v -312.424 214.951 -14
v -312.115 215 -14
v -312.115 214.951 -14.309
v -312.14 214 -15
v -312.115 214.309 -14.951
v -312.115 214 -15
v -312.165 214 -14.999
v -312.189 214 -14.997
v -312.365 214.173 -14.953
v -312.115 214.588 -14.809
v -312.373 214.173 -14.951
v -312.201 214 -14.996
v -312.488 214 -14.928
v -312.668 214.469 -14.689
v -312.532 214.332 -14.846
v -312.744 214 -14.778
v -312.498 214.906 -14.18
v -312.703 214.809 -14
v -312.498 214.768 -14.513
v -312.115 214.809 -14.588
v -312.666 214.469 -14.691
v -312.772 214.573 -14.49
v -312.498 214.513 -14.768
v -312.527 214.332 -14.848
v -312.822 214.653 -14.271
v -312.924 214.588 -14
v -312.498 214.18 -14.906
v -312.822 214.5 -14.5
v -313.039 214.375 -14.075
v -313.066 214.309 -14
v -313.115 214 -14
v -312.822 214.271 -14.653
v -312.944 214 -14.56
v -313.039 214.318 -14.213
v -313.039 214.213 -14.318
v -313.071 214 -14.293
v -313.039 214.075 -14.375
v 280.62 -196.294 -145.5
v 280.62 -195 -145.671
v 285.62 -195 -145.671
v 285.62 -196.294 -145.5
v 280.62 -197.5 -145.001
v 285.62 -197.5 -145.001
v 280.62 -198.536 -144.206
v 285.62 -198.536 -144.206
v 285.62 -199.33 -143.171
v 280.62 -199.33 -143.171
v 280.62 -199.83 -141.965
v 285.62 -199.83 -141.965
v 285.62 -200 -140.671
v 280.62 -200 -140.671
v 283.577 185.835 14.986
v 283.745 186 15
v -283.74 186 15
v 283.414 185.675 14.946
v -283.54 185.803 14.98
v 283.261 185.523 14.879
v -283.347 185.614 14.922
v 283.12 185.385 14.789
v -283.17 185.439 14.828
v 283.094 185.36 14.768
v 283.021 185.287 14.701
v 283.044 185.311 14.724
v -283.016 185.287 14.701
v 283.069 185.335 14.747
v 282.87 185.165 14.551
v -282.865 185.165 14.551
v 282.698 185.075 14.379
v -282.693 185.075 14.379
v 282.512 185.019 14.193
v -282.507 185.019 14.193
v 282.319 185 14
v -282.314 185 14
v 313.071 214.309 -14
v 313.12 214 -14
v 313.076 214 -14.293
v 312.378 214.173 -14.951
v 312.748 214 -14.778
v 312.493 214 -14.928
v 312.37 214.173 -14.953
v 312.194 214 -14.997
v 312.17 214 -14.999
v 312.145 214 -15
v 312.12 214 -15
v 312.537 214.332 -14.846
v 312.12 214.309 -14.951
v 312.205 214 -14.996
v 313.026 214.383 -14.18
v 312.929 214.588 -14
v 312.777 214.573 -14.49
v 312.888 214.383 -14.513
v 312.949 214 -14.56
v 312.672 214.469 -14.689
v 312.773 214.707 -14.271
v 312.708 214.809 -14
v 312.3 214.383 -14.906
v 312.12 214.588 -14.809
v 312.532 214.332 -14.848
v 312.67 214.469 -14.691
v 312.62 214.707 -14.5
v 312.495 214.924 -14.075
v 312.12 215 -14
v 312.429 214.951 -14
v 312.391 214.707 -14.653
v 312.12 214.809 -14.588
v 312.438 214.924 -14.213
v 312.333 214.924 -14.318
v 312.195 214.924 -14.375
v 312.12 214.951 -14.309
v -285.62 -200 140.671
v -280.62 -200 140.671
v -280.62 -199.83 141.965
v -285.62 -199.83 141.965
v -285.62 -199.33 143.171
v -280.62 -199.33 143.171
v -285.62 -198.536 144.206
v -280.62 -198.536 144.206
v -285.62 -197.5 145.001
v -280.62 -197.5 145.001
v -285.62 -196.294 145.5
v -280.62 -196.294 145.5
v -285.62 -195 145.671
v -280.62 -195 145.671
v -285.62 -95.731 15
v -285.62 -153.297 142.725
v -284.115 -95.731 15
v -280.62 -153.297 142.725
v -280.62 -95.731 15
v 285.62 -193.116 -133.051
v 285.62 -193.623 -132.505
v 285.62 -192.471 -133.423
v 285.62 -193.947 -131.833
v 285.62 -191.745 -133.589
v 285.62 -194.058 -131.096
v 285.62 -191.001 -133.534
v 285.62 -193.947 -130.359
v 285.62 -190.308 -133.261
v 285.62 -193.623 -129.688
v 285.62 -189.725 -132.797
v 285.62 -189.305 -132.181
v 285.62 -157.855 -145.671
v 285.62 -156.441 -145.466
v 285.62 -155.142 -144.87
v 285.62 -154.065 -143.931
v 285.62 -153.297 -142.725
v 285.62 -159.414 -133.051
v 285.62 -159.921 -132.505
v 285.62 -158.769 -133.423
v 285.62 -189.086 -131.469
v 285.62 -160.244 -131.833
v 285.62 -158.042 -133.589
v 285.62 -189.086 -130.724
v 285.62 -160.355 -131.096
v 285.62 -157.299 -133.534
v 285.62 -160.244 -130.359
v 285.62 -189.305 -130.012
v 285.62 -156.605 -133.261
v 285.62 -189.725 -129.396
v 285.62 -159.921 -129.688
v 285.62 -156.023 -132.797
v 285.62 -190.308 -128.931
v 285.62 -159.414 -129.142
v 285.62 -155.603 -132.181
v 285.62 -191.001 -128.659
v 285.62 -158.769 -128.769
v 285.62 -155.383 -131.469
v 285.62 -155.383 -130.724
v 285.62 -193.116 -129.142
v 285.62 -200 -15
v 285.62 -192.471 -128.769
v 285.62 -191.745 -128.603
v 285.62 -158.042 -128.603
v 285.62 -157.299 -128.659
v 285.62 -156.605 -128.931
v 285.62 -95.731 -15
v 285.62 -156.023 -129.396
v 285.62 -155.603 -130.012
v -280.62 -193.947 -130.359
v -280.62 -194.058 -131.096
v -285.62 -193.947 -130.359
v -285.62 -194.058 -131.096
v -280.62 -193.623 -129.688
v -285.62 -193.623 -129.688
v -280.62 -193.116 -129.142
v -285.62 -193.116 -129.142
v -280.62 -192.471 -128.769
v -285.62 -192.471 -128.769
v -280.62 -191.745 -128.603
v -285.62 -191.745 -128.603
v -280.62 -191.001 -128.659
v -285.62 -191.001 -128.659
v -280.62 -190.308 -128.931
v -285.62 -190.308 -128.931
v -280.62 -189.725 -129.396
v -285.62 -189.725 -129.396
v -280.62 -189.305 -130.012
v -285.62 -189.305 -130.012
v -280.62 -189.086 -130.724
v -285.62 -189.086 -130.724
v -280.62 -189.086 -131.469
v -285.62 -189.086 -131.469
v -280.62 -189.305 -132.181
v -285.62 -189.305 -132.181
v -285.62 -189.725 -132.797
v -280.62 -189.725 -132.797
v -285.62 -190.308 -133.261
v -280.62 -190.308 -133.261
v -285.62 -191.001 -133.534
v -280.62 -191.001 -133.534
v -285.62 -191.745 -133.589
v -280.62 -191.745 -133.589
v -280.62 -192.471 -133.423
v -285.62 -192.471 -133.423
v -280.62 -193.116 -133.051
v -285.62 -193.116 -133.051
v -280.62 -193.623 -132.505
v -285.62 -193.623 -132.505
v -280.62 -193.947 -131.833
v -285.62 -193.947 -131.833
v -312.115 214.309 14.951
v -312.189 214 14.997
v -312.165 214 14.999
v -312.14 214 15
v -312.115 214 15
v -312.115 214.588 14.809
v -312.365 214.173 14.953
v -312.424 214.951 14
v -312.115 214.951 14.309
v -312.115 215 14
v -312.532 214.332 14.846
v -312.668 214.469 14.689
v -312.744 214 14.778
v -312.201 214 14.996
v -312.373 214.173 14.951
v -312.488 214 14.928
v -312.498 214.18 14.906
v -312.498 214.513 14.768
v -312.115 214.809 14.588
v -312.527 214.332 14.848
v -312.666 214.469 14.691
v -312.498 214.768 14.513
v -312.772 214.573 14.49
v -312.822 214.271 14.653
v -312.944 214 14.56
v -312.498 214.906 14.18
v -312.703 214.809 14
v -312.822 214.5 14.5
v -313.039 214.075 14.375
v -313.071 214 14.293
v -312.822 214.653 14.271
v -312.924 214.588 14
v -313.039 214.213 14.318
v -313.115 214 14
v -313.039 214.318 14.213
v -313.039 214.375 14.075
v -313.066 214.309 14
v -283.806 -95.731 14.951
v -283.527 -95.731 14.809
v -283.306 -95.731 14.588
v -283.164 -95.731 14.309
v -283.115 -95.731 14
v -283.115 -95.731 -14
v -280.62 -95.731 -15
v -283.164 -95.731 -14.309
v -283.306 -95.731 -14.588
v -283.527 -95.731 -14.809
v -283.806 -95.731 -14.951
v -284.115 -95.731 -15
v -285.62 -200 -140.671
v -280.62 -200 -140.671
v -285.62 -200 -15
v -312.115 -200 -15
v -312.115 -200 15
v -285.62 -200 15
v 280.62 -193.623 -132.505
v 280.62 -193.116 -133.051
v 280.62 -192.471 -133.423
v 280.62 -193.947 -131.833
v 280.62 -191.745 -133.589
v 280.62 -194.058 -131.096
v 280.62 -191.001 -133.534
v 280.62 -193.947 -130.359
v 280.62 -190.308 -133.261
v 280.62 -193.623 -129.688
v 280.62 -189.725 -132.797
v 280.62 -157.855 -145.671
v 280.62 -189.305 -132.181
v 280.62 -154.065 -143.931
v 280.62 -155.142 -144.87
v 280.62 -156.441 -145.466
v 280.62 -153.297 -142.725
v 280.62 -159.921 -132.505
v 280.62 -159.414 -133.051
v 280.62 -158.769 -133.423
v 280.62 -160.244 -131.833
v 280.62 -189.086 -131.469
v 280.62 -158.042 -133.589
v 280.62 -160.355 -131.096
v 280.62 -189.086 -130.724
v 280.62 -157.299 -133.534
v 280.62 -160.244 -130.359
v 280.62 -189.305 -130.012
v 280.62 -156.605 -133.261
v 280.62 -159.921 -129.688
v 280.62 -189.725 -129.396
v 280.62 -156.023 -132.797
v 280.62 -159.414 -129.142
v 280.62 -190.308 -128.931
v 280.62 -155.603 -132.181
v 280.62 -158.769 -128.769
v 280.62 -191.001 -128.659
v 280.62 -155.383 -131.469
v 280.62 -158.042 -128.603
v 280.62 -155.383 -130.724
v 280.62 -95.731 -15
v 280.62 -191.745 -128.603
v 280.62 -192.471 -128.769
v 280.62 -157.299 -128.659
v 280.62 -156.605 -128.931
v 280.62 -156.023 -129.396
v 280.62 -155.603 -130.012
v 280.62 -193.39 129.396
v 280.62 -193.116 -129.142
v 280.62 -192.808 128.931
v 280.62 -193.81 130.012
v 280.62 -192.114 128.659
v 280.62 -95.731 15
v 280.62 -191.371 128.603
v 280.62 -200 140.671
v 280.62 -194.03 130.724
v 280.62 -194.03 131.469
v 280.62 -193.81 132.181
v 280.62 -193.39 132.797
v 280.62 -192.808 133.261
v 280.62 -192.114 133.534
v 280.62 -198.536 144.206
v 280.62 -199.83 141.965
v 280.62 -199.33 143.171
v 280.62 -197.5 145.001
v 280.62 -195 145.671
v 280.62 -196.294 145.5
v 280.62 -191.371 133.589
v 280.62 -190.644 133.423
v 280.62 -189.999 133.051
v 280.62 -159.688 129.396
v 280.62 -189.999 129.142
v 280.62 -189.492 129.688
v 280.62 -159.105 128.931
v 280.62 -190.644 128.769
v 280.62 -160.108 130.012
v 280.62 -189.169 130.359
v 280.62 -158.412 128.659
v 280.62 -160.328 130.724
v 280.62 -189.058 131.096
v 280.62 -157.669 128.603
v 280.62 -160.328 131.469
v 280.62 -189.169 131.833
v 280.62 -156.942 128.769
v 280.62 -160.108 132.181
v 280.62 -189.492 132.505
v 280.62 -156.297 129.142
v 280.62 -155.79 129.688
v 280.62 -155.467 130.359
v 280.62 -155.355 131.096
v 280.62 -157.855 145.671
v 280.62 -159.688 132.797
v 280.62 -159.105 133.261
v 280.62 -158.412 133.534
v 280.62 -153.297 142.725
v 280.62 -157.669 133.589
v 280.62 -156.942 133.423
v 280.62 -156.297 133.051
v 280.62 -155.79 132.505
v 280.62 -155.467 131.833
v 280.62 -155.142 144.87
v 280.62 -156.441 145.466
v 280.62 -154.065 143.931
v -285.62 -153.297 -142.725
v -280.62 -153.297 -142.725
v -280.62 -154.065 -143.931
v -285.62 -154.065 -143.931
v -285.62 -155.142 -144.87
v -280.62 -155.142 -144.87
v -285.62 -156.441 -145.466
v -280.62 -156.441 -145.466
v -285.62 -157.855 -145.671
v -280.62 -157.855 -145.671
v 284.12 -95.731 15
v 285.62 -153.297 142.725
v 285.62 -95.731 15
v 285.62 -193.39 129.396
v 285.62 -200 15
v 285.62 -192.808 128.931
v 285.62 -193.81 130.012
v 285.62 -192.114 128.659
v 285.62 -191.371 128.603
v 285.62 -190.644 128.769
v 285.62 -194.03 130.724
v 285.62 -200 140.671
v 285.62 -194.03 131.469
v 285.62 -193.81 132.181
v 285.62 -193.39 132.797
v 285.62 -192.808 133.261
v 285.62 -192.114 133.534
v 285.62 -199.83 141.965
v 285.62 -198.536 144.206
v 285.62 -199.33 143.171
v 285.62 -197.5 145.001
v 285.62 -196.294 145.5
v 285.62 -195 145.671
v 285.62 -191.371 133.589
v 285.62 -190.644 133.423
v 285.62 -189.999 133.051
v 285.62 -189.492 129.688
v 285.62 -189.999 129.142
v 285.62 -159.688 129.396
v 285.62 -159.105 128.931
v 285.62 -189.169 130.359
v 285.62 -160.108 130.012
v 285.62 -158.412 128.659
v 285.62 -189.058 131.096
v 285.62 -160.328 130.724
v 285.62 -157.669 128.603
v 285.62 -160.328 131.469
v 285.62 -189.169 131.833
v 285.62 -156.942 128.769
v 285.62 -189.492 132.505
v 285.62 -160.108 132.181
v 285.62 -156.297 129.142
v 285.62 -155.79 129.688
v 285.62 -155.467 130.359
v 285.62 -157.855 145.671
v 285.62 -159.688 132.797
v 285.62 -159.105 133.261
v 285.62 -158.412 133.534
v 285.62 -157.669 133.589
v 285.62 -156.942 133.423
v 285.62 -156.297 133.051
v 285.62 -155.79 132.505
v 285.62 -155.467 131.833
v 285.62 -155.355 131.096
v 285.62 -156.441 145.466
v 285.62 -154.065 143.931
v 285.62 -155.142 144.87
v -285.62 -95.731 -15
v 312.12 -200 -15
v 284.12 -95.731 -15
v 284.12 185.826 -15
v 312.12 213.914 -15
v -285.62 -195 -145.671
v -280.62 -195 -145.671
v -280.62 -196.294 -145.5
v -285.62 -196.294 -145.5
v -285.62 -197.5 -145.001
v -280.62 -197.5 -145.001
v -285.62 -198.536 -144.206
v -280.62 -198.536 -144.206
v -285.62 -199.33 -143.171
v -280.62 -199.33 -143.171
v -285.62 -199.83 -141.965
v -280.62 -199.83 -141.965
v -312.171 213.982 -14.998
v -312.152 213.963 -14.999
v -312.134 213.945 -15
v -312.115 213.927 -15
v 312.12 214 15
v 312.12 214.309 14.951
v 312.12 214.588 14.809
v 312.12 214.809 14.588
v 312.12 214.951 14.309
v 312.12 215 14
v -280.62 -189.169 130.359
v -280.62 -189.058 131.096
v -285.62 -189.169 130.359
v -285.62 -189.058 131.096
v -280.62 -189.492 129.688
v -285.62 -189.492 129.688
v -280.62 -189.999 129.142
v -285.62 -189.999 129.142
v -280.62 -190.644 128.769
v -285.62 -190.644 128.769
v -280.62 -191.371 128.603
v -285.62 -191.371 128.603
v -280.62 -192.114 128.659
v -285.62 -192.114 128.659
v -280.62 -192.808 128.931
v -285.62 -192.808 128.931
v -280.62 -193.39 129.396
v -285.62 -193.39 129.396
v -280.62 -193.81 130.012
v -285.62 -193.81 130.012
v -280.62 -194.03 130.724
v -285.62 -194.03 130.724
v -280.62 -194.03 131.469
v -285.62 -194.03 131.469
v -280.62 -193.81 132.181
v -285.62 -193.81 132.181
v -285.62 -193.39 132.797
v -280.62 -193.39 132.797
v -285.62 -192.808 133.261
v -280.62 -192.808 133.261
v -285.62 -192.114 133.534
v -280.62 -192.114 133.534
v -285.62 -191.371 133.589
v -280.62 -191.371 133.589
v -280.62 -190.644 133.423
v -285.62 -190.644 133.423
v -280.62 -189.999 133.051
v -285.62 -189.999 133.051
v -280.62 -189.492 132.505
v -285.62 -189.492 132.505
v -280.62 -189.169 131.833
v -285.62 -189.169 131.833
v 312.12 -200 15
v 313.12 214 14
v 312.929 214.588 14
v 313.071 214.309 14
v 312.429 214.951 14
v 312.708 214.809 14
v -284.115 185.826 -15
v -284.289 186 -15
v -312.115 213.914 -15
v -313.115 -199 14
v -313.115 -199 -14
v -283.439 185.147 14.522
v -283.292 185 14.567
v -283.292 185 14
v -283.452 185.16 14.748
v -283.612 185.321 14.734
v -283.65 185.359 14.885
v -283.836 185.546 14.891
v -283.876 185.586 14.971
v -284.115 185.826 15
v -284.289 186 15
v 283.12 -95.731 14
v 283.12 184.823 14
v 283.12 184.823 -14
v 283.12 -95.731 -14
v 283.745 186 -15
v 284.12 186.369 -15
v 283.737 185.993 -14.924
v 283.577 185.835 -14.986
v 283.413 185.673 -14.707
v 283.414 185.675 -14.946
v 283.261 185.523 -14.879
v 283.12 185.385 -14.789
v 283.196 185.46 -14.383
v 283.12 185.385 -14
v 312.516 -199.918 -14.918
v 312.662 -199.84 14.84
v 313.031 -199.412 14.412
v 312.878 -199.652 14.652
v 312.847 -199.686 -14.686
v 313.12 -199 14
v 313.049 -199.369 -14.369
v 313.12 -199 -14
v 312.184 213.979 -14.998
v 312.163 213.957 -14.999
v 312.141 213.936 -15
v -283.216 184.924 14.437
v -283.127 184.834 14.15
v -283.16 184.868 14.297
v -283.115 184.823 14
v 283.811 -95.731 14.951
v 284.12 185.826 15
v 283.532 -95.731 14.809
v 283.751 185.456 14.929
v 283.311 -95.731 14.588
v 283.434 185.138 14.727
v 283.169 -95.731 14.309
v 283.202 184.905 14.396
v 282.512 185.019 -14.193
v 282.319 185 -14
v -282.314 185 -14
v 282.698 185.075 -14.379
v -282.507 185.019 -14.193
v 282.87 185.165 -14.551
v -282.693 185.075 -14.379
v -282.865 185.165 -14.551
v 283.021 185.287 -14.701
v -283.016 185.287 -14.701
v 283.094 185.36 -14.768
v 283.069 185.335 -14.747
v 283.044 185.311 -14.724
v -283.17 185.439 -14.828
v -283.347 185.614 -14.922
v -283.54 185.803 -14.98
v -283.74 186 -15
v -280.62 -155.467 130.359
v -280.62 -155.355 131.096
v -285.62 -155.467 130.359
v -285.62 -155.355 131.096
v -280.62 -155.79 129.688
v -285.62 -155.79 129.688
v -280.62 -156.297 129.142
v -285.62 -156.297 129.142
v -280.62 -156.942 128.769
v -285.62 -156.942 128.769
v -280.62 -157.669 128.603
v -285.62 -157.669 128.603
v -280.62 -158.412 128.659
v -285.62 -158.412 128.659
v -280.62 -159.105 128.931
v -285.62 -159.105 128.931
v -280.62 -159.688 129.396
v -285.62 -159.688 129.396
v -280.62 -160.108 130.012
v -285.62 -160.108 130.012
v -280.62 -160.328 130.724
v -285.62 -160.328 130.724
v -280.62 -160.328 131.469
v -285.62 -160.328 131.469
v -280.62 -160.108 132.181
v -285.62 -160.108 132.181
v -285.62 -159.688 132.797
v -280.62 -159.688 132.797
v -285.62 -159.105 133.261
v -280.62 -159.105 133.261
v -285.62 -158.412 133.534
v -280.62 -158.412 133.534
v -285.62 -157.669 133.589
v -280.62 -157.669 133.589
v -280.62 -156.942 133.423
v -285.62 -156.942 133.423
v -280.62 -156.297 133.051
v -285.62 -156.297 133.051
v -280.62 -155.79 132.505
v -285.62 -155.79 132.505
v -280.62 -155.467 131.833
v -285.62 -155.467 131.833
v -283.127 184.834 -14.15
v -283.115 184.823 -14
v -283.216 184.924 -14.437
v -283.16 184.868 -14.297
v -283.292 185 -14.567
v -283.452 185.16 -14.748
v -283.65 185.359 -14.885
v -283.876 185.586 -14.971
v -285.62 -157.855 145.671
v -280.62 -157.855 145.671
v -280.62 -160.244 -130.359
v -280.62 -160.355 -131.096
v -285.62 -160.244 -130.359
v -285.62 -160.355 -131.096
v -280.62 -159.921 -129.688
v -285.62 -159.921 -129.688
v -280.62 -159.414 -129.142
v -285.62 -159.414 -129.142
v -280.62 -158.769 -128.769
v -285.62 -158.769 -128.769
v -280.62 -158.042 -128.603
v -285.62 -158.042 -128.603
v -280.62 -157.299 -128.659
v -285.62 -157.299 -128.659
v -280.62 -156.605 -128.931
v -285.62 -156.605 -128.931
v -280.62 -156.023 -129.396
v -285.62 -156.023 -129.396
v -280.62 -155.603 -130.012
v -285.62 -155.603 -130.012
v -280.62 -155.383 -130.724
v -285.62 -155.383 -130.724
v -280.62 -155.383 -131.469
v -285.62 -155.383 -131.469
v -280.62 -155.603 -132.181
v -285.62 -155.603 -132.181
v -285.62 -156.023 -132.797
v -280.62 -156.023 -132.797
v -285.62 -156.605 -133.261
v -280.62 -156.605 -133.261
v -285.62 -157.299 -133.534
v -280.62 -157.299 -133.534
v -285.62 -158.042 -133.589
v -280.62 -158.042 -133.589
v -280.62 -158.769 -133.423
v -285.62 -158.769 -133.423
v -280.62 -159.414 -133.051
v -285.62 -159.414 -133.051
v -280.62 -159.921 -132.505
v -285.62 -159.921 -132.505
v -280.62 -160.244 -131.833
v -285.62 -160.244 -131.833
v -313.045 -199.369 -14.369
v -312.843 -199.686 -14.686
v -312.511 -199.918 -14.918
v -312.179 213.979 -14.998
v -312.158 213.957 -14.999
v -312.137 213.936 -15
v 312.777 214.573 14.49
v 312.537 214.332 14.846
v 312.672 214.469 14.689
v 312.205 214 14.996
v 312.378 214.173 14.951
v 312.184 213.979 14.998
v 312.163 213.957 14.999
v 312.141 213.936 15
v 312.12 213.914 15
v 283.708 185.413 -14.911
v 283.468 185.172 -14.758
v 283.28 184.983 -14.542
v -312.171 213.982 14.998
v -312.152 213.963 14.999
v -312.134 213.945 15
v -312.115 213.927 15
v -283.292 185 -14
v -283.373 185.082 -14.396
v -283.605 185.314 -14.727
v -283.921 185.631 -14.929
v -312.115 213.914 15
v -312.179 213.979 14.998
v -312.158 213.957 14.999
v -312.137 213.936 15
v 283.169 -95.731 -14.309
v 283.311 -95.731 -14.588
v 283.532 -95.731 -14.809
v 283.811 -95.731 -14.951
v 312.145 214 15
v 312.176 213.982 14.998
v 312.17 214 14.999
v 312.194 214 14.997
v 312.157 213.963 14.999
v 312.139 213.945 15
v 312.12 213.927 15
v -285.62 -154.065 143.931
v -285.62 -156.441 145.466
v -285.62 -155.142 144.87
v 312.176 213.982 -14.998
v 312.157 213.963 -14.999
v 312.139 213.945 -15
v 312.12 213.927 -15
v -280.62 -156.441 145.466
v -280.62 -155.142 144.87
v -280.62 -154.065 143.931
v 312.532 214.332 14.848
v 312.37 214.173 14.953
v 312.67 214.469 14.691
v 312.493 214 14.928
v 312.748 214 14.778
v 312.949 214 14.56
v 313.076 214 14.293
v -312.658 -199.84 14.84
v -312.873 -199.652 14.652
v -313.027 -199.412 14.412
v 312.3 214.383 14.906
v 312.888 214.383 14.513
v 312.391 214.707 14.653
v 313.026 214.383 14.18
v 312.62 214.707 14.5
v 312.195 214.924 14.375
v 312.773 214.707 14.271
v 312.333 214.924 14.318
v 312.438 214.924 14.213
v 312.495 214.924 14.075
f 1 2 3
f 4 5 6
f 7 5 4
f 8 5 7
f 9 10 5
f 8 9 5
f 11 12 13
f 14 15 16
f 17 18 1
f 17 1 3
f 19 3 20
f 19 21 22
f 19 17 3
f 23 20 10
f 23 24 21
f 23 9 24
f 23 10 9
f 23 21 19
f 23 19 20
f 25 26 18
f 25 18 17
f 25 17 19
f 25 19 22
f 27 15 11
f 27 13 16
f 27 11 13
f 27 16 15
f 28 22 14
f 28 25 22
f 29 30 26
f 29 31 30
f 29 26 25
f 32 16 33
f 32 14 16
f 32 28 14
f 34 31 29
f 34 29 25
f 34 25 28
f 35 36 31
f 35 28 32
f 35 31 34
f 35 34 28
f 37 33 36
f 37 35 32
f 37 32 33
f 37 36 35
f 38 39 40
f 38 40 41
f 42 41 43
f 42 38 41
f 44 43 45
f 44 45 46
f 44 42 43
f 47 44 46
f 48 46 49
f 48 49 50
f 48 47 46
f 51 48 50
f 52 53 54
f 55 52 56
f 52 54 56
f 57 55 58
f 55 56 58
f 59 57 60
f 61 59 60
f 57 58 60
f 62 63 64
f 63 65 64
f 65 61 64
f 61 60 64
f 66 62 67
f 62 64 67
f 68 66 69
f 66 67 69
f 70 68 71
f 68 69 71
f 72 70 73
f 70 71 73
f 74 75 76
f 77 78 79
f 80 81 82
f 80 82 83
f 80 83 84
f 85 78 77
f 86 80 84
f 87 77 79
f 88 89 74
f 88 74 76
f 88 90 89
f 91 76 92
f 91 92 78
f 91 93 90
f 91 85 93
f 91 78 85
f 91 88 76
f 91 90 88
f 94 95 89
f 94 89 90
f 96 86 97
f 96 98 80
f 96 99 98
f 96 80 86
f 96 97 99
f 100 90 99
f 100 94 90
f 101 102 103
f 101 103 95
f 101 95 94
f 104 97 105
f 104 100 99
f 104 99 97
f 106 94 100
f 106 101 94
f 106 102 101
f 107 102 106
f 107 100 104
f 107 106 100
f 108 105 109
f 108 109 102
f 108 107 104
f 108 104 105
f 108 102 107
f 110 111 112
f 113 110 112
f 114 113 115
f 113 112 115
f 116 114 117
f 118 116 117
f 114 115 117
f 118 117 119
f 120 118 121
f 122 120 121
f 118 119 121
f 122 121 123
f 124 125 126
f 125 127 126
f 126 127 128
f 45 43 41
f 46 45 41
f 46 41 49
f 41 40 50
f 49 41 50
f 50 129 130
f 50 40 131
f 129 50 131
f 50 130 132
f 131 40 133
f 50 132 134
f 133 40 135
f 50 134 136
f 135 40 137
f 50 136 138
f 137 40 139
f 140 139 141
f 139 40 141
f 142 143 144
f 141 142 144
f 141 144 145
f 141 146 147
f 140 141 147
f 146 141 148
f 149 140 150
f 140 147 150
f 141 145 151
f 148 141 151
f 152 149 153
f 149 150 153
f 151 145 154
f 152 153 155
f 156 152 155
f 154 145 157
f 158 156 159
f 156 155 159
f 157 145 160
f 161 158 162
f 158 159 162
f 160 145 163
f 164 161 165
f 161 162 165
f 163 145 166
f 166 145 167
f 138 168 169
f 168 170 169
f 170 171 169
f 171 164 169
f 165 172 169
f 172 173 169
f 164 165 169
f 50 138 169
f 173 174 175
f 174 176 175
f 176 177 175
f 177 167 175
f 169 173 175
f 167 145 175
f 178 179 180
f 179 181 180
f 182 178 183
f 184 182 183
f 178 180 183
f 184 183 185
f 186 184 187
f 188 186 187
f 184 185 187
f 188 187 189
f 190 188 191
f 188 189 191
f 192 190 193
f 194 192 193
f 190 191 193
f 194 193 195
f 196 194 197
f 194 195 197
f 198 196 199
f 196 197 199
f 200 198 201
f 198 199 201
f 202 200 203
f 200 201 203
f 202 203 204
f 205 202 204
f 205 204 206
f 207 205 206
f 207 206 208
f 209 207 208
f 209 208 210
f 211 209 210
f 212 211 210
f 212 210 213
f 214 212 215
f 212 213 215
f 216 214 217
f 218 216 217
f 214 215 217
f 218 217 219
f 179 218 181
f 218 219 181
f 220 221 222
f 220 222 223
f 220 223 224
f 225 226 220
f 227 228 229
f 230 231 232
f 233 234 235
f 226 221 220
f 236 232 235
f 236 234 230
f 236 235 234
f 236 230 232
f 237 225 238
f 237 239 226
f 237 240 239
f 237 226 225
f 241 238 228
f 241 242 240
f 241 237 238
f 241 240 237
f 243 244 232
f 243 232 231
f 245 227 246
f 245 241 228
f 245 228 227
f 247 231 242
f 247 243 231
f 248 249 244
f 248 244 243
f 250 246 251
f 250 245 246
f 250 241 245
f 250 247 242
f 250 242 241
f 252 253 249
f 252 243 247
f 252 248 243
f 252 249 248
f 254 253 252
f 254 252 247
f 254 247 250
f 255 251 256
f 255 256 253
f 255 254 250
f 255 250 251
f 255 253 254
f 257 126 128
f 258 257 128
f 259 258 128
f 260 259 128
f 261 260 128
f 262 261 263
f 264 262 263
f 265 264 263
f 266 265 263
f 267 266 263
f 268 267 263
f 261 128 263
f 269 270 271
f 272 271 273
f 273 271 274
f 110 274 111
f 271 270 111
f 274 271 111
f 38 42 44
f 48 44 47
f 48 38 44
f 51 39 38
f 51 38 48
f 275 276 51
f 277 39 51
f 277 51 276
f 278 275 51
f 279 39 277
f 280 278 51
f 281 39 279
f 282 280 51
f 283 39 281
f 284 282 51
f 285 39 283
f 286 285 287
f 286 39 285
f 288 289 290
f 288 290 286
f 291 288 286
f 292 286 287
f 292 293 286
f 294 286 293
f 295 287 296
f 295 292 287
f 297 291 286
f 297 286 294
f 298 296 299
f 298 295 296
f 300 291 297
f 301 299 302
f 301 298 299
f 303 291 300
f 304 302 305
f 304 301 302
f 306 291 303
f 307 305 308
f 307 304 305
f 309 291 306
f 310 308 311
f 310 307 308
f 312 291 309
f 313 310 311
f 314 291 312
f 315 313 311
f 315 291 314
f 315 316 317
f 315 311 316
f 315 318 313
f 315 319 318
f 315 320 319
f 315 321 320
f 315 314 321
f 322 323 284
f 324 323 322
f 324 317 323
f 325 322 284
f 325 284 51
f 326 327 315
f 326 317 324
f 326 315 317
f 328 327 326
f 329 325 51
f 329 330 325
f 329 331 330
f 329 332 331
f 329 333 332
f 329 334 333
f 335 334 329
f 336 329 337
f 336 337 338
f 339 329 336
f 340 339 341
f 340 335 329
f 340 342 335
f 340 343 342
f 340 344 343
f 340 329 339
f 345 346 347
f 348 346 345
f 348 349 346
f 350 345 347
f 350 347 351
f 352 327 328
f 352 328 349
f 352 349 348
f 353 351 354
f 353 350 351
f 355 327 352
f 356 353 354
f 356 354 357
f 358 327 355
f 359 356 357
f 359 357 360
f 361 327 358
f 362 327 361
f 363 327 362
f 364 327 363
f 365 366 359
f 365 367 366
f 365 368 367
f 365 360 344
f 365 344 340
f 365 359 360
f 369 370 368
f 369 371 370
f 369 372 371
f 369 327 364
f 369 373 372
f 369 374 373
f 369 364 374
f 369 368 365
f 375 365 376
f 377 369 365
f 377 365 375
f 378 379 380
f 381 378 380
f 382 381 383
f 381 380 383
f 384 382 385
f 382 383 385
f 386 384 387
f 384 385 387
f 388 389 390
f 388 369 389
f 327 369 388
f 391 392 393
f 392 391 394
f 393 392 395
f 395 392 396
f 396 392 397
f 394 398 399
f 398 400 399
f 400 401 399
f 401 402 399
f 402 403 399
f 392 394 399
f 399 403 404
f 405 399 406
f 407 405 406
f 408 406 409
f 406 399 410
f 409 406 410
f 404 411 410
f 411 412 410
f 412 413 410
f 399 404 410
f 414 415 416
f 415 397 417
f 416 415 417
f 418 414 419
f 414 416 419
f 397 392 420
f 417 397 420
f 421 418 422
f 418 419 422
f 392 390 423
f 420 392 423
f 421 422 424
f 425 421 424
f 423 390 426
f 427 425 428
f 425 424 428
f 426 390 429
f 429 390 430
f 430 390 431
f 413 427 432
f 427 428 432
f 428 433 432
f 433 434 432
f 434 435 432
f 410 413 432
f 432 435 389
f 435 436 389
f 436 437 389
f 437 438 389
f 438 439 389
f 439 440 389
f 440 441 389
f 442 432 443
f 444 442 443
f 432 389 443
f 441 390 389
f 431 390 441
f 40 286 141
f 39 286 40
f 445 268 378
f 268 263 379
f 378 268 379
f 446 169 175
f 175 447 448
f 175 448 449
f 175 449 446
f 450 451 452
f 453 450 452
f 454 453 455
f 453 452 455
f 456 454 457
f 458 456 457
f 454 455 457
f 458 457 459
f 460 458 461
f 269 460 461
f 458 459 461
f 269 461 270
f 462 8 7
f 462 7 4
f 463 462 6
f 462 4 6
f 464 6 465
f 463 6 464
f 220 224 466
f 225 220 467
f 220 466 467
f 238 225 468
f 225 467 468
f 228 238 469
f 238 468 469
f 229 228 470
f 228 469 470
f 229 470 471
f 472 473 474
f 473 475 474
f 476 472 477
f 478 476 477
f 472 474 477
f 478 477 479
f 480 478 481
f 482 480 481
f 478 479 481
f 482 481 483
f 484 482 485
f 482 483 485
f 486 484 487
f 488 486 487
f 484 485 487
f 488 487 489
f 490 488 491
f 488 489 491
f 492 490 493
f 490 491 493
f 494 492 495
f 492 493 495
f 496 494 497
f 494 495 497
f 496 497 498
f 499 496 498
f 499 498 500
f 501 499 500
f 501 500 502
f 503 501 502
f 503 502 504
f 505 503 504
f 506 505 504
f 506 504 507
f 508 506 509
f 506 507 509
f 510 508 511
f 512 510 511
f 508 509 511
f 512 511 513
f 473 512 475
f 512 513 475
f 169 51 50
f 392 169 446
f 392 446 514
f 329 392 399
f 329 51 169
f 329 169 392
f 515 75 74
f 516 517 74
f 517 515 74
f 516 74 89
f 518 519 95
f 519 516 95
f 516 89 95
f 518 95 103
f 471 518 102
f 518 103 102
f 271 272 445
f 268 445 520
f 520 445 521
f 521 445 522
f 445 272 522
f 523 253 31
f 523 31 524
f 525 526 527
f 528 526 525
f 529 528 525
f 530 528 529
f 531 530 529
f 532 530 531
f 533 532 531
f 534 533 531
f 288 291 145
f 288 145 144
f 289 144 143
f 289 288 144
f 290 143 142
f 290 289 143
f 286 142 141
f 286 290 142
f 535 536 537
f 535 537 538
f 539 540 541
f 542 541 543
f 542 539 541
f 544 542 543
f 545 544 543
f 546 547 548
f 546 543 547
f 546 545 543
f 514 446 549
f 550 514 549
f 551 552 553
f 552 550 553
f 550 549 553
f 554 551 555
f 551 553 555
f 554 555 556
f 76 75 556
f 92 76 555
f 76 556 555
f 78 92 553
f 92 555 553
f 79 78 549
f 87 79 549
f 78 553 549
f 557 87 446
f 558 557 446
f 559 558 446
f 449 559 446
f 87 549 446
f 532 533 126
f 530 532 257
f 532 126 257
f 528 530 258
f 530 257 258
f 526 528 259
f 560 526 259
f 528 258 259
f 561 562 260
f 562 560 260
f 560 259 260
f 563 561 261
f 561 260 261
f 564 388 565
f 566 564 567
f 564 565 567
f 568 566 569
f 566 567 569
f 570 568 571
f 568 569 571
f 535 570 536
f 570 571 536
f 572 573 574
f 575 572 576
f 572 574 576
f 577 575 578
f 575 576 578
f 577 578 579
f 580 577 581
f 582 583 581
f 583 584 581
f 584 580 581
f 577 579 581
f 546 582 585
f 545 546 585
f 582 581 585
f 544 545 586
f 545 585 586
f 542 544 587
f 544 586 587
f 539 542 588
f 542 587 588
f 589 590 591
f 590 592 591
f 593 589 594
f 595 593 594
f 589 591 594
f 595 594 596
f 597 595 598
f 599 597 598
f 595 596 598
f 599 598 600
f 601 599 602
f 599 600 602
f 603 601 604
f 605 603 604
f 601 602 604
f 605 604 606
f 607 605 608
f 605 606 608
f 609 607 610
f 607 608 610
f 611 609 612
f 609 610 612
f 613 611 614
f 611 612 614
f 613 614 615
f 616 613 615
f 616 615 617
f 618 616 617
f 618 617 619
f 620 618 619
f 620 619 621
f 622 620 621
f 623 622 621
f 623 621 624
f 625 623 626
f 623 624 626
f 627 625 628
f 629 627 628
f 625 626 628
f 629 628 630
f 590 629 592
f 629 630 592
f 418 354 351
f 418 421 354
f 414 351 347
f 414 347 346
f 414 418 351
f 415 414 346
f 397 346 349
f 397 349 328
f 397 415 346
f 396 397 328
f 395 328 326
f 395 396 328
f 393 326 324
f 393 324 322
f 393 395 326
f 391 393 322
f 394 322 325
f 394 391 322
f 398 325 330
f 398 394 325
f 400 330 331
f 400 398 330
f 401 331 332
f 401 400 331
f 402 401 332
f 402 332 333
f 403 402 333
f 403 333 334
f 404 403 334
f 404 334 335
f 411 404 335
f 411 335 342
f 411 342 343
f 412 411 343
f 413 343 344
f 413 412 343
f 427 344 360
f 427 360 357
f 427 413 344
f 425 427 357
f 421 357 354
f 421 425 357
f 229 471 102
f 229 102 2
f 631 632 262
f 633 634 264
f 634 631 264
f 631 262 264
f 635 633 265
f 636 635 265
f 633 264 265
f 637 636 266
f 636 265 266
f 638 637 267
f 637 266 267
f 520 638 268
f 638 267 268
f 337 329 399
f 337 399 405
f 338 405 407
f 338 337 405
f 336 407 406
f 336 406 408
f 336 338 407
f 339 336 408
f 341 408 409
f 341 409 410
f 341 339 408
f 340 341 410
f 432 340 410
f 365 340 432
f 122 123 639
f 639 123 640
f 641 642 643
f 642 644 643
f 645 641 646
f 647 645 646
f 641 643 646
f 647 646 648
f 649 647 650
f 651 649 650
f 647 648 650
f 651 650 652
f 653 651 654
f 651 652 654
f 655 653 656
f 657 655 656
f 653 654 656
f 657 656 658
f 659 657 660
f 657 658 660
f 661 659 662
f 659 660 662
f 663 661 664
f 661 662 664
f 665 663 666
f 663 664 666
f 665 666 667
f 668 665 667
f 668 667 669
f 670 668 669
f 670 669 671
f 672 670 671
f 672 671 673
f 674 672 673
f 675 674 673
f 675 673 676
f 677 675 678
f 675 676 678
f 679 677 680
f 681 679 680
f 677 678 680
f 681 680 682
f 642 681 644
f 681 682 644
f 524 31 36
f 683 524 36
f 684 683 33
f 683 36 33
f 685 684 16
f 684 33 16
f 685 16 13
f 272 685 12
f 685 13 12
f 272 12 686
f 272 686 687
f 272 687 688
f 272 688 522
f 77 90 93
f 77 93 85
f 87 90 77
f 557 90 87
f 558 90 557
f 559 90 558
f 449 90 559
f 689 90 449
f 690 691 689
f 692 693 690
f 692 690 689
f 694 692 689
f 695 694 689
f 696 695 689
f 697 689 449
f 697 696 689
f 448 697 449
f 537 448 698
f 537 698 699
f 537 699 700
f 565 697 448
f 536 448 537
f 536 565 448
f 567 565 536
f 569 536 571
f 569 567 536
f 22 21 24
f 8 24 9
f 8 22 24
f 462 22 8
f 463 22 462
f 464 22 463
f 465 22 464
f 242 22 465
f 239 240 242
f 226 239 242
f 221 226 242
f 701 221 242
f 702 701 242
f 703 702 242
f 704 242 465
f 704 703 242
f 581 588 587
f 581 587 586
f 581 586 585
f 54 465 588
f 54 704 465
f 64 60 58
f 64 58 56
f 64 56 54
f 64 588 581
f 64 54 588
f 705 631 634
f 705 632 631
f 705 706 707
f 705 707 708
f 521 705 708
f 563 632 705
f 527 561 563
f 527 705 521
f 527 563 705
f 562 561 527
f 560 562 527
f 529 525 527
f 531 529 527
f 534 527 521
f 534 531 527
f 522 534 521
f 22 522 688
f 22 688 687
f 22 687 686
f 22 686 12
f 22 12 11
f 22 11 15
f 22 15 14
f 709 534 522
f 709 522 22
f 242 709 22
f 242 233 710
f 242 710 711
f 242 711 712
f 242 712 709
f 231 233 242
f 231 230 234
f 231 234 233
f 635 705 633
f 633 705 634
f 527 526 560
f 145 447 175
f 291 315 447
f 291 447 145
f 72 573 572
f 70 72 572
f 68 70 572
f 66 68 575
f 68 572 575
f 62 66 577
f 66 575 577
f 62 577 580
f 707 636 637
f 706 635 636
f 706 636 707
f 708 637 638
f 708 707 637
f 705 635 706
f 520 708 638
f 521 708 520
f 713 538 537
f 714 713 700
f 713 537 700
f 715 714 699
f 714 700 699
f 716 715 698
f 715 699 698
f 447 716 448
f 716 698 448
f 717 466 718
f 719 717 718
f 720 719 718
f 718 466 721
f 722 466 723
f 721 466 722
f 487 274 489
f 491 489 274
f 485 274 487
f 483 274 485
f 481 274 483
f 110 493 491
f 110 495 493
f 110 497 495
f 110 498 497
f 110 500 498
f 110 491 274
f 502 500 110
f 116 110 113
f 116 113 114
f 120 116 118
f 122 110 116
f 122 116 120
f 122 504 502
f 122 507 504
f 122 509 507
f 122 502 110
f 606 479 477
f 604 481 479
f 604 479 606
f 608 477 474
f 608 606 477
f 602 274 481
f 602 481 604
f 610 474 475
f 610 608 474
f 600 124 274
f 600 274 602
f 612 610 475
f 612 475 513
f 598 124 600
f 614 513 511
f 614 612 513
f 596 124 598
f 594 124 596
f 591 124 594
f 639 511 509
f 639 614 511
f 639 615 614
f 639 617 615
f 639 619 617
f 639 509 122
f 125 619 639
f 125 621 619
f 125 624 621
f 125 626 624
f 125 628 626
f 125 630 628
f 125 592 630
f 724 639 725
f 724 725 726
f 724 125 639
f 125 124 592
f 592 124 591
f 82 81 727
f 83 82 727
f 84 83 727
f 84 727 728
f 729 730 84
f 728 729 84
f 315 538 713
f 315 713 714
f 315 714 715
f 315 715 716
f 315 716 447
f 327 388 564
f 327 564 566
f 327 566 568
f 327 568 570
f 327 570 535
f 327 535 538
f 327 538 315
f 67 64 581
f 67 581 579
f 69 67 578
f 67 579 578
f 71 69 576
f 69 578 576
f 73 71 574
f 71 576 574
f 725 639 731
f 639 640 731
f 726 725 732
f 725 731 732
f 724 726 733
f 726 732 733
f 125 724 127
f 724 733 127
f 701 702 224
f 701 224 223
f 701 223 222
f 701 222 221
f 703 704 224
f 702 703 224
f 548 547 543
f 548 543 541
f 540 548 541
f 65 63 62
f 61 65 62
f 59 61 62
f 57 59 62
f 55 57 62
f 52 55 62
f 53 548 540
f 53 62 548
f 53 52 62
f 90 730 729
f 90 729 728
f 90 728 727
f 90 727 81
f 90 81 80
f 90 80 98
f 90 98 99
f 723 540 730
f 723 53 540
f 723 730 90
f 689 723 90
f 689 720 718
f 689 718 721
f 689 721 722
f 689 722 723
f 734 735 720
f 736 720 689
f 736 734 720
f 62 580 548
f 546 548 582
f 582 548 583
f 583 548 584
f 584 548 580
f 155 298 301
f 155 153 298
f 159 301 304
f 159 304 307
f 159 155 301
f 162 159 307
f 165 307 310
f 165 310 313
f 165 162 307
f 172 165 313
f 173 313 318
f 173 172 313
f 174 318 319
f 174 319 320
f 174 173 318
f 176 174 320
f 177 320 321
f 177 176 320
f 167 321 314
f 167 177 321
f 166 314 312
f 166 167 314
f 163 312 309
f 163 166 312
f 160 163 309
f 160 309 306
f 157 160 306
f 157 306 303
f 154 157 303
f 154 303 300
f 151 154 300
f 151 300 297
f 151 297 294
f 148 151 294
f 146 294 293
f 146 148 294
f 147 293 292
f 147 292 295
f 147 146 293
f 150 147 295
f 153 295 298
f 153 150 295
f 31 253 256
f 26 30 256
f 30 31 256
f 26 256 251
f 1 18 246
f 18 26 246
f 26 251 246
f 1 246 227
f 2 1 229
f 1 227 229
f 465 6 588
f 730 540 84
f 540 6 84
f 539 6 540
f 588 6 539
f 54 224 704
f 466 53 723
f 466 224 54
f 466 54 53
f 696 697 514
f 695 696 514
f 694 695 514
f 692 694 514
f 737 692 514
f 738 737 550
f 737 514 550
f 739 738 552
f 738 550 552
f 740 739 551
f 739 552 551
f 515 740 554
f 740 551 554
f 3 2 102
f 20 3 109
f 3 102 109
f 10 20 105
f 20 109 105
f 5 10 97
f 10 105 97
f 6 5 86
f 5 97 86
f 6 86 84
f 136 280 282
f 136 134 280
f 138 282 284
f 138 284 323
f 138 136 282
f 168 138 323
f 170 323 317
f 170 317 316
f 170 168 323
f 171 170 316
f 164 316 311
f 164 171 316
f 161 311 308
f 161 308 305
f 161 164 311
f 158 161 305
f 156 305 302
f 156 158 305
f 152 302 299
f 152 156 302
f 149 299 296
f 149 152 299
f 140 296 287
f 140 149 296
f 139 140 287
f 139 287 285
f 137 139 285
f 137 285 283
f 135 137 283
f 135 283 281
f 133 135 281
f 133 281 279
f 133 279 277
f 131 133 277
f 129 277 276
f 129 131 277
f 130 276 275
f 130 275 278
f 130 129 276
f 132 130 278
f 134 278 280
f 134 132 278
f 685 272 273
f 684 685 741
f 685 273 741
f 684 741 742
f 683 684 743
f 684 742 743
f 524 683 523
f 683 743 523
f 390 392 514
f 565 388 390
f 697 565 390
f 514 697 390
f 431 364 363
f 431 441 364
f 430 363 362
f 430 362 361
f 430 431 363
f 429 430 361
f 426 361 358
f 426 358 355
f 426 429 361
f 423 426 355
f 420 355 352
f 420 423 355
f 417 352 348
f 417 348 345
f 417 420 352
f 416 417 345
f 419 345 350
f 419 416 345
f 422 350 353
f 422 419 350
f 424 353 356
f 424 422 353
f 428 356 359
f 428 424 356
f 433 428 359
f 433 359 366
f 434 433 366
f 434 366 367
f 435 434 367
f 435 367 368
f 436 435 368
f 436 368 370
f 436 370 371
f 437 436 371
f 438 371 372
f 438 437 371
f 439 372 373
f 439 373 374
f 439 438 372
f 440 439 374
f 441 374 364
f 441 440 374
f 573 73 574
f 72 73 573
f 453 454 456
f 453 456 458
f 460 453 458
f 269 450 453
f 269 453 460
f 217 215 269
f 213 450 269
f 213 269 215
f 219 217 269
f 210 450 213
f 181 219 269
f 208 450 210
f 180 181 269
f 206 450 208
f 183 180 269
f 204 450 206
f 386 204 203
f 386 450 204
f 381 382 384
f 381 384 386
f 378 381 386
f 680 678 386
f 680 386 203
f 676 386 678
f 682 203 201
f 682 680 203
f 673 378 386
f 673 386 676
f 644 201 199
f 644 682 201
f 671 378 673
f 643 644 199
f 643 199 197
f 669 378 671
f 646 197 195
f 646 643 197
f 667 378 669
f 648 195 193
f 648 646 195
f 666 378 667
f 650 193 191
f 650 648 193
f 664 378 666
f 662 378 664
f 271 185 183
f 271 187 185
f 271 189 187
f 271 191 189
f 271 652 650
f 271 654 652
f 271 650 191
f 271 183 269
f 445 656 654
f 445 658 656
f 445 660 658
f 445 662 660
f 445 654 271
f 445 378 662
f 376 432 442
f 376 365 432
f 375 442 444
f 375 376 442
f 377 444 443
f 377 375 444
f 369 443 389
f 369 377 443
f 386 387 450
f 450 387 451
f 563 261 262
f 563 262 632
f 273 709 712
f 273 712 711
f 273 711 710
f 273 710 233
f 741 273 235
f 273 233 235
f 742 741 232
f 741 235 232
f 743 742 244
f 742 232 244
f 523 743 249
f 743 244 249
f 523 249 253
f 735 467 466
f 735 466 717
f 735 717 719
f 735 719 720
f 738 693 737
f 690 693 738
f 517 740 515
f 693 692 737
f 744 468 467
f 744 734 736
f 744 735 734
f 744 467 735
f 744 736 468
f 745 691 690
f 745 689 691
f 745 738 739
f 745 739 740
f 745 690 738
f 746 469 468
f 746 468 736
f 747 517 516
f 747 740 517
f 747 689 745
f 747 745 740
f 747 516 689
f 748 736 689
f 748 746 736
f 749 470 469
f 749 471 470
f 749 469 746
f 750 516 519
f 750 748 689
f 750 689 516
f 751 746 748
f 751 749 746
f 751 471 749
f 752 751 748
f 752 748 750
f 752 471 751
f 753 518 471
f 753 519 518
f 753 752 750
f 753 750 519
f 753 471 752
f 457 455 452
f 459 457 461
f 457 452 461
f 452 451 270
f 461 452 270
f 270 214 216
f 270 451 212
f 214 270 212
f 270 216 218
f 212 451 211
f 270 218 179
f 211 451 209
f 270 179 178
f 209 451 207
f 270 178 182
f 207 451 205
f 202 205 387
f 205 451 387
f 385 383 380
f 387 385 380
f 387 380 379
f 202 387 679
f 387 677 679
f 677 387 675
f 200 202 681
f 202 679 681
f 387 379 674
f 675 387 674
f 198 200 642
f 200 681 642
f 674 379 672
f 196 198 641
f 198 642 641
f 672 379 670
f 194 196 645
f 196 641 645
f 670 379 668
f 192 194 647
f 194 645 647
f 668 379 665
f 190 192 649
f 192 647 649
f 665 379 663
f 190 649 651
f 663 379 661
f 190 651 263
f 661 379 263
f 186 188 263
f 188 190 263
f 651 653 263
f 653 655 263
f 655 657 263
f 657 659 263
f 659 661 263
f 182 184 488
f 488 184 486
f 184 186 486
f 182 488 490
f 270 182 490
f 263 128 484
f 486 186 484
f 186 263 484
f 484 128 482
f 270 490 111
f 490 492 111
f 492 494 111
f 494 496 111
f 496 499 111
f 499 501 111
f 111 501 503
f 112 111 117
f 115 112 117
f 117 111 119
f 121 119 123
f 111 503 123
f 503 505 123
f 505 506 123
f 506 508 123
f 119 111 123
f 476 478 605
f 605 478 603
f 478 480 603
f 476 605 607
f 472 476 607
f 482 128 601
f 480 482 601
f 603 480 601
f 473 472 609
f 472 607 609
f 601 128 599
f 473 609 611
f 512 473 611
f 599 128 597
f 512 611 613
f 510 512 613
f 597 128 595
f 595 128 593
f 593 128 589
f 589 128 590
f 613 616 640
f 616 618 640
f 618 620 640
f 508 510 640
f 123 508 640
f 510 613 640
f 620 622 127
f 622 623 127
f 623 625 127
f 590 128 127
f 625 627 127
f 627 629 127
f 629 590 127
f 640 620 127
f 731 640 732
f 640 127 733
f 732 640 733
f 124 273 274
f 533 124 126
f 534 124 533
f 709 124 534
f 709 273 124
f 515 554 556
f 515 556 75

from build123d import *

# Parameters (mm, degrees)
BOSS_EXTRUDE1_DEPTH = 15
SKETCH2_R           = 2.5
BOSS_EXTRUDE2_DEPTH = 2.5
FILLET1_R           = 1


with BuildPart() as part:
    # Sketch1 → Boss-Extrude1 (new, symmetric)
    with BuildSketch(Plane.XY):
        Polygon((-283.115153194, -200), (-283.115153194, 184.822832525), (-312.771891152, 214.573189293), (-282.723872007, 185), (282.728718813, 185), (312.776737958, 214.573189293), (283.12, 184.822832525), (283.12, -200), (313.12, -200), (313.12, 215), (-313.115153194, 215), (-313.115153194, -200), align=None)
    extrude(amount=BOSS_EXTRUDE1_DEPTH, both=True)

    # Sketch2 → Boss-Extrude2 (add, symmetric)
    with BuildSketch(Plane.ZY.offset(-283.12)):
        with BuildLine():
            Line((-15, -95.731232334), (-142.725217813, -153.297064452))
            ThreePointArc((-142.725217813, -153.297064452), (-144.870286213, -155.141843308), (-145.67073896, -157.855476088))
            Line((-145.67073896, -157.855476088), (-145.67073896, -195))
            ThreePointArc((-145.67073896, -195), (-144.206272866, -198.535533906), (-140.67073896, -200))
            Line((-140.67073896, -200), (140.67073896, -200))
            ThreePointArc((140.67073896, -200), (144.206272866, -198.535533906), (145.67073896, -195))
            Line((145.67073896, -195), (145.67073896, -157.855476088))
            ThreePointArc((145.67073896, -157.855476088), (144.870286213, -155.141843308), (142.725217813, -153.297064452))
            Line((142.725217813, -153.297064452), (15, -95.731232334))
            Line((15, -95.731232334), (-15, -95.731232334))
        make_face()
        with Locations(Location((-131.096268678, -157.855476088, 0), (0, 0, 270))):
            Circle(SKETCH2_R, mode=Mode.SUBTRACT)
        with Locations(Location((-131.096268678, -191.557763375, 0), (0, 0, 270))):
            Circle(SKETCH2_R, mode=Mode.SUBTRACT)
        with Locations(Location((131.096268678, -191.557763375, 0), (0, 0, 90))):
            Circle(SKETCH2_R, mode=Mode.SUBTRACT)
        with Locations(Location((131.096268678, -157.855476088, 0), (0, 0, 90))):
            Circle(SKETCH2_R, mode=Mode.SUBTRACT)
    boss_extrude2 = extrude(amount=BOSS_EXTRUDE2_DEPTH, both=True)

    # Mirror2: Boss-Extrude2 across plane
    add(boss_extrude2.mirror(Plane(origin=(0, 0, 0), x_dir=(0, 0, 1), z_dir=(1, 0, 0))))

    # Fillet1
    # the kernel refuses this fillet: 1 mm, written as the material it takes off along each edge
    with BuildSketch(Plane(origin=(-312.115153194, 214, -14), x_dir=(0, 0, -1), z_dir=(-1, 0, 0))) as fillet1_piece_1_section:
        Polygon((0, 0), (FILLET1_R * 1.02, 0), (FILLET1_R * 1.02, -FILLET1_R * 1.02), (0, -FILLET1_R * 1.02), align=None)
    fillet1_piece_1 = extrude(amount=FILLET1_R * 1.02, mode=Mode.PRIVATE)
    fillet1_piece_1 = fillet1_piece_1 - Plane(origin=(-312.115153194, 214, -14), x_dir=(0, -0.7071067811865475, 0.7071067811865475), z_dir=(-1, 0, 0)) * Sphere(FILLET1_R, mode=Mode.PRIVATE)
    add(fillet1_piece_1, mode=Mode.SUBTRACT)
    with BuildSketch(Plane(origin=(312.12, 214, -14), x_dir=(1, 0, 0), z_dir=(0, 1, 0))) as fillet1_piece_2_section:
        Polygon((0, 0), (FILLET1_R * 1.02, 0), (FILLET1_R * 1.02, FILLET1_R * 1.02), (0, FILLET1_R * 1.02), align=None)
    fillet1_piece_2 = extrude(amount=FILLET1_R * 1.02, mode=Mode.PRIVATE)
    fillet1_piece_2 = fillet1_piece_2 - Plane(origin=(312.12, 214, -14), x_dir=(-0.7071067811865475, 0, 0.7071067811865475), z_dir=(0, 1, 0)) * Sphere(FILLET1_R, mode=Mode.PRIVATE)
    add(fillet1_piece_2, mode=Mode.SUBTRACT)
    with BuildSketch(Plane(origin=(-312.115153194, 214, 14), x_dir=(0, 0, 1), z_dir=(-1, 0, 0))) as fillet1_piece_3_section:
        Polygon((0, 0), (FILLET1_R * 1.02, 0), (FILLET1_R * 1.02, FILLET1_R * 1.02), (0, FILLET1_R * 1.02), align=None)
    fillet1_piece_3 = extrude(amount=FILLET1_R * 1.02, mode=Mode.PRIVATE)
    fillet1_piece_3 = fillet1_piece_3 - Plane(origin=(-312.115153194, 214, 14), x_dir=(0, -0.7071067811865475, -0.7071067811865475), z_dir=(-1, 0, 0)) * Sphere(FILLET1_R, mode=Mode.PRIVATE)
    add(fillet1_piece_3, mode=Mode.SUBTRACT)
    with BuildSketch(Plane(origin=(312.12, 214, 14), x_dir=(1, 0, 0), z_dir=(0, 1, 0))) as fillet1_piece_4_section:
        Polygon((0, 0), (FILLET1_R * 1.02, 0), (FILLET1_R * 1.02, -FILLET1_R * 1.02), (0, -FILLET1_R * 1.02), align=None)
    fillet1_piece_4 = extrude(amount=FILLET1_R * 1.02, mode=Mode.PRIVATE)
    fillet1_piece_4 = fillet1_piece_4 - Plane(origin=(312.12, 214, 14), x_dir=(-0.7071067811865475, 0, -0.7071067811865475), z_dir=(0, 1, 0)) * Sphere(FILLET1_R, mode=Mode.PRIVATE)
    add(fillet1_piece_4, mode=Mode.SUBTRACT)
    with BuildSketch(Plane(origin=(-313.115153194, 214, -15), x_dir=(0, 0, 1), z_dir=(0, -1, 0)), Plane(origin=(313.12, -202.5, 15), x_dir=(-1, 0, 0), z_dir=(0, 1, 0))) as fillet1_piece_5:
        with BuildLine():
            CenterArc((FILLET1_R, -FILLET1_R), FILLET1_R, 90, 90)
            Line((0, -FILLET1_R), (0, 0))
            Line((0, 0), (FILLET1_R, 0))
        make_face()
    extrude(amount=416.5, mode=Mode.SUBTRACT)
    with BuildSketch(Plane(origin=(312.12, 215, -15), x_dir=(0, -1, 0), z_dir=(-1, 0, 0))) as fillet1_piece_6:
        with BuildLine():
            CenterArc((FILLET1_R, FILLET1_R), FILLET1_R, 180, 90)
            Line((0, FILLET1_R), (0, 0))
            Line((0, 0), (FILLET1_R, 0))
        make_face()
    extrude(amount=624.235153194, mode=Mode.SUBTRACT)
    with BuildSketch(Plane(origin=(313.12, -202.5, -15), x_dir=(-1, 0, 0), z_dir=(0, 1, 0)), Plane(origin=(-313.115153194, 214, 15), x_dir=(0, 0, -1), z_dir=(0, -1, 0))) as fillet1_piece_7:
        with BuildLine():
            CenterArc((FILLET1_R, FILLET1_R), FILLET1_R, 180, 90)
            Line((0, FILLET1_R), (0, 0))
            Line((0, 0), (FILLET1_R, 0))
        make_face()
    extrude(amount=416.5, mode=Mode.SUBTRACT)
    with BuildSketch(Plane(origin=(283.12, 187.322832525, -15), x_dir=(1, 0, 0), z_dir=(0, -1, 0))) as fillet1_piece_8_section:
        with BuildLine():
            CenterArc((FILLET1_R, FILLET1_R), FILLET1_R, 180, 90)
            Line((0, FILLET1_R), (0, 0))
            Line((0, 0), (FILLET1_R, 0))
        make_face()
    fillet1_piece_8 = extrude(amount=283.054064858, mode=Mode.PRIVATE)
    fillet1_piece_8 = split(fillet1_piece_8, bisect_by=Plane(origin=(212.904028108, 116.278704743, -14.776762441), z_dir=(0.7014530599300108, -0.712715654882664, 0)), keep=Keep.TOP, mode=Mode.PRIVATE)
    add(fillet1_piece_8, mode=Mode.SUBTRACT)
    with BuildSketch(Plane(origin=(-285.223872007, 185, -15), x_dir=(0, 1, 0), z_dir=(1, 0, 0))) as fillet1_piece_9_section:
        with BuildLine():
            CenterArc((FILLET1_R, FILLET1_R), FILLET1_R, 180, 90)
            Line((0, FILLET1_R), (0, 0))
            Line((0, 0), (FILLET1_R, 0))
        make_face()
    fillet1_piece_9 = extrude(amount=570.45259082, mode=Mode.PRIVATE)
    fillet1_piece_9 = split(fillet1_piece_9, bisect_by=Plane(origin=(139.225783569, 43.764750927, -14.776706333), z_dir=(-0.7014530599300108, 0.712715654882664, 0)), keep=Keep.TOP, mode=Mode.PRIVATE)
    fillet1_piece_9 = split(fillet1_piece_9, bisect_by=Plane(origin=(-142.20285466, 43.465709552, -14.776706333), z_dir=(0.7082202214843082, 0.7059915848512059, 0)), keep=Keep.TOP, mode=Mode.PRIVATE)
    add(fillet1_piece_9, mode=Mode.SUBTRACT)
    with BuildSketch(Plane(origin=(-313.115153194, -200, 17.5), x_dir=(1, 0, 0), z_dir=(0, 0, -1))) as fillet1_piece_10:
        with BuildLine():
            CenterArc((FILLET1_R, -FILLET1_R), FILLET1_R, 90, 90)
            Line((0, -FILLET1_R), (0, 0))
            Line((0, 0), (FILLET1_R, 0))
        make_face()
    extrude(amount=35, mode=Mode.SUBTRACT)
    with BuildSketch(Plane(origin=(-313.115153194, 215, 14), x_dir=(0, -1, 0), z_dir=(0, 0, -1))) as fillet1_piece_11:
        with BuildLine():
            CenterArc((FILLET1_R, -FILLET1_R), FILLET1_R, 90, 90)
            Line((0, -FILLET1_R), (0, 0))
            Line((0, 0), (FILLET1_R, 0))
        make_face()
    extrude(amount=28, mode=Mode.SUBTRACT)
    with BuildSketch(Plane(origin=(313.12, 215, -14), x_dir=(-1, 0, 0), z_dir=(0, 0, 1))) as fillet1_piece_12:
        with BuildLine():
            CenterArc((FILLET1_R, FILLET1_R), FILLET1_R, 180, 90)
            Line((0, FILLET1_R), (0, 0))
            Line((0, 0), (FILLET1_R, 0))
        make_face()
    extrude(amount=28, mode=Mode.SUBTRACT)
    with BuildSketch(Plane(origin=(-285.223872007, 185, 15), x_dir=(0, 1, 0), z_dir=(1, 0, 0))) as fillet1_piece_13_section:
        with BuildLine():
            CenterArc((FILLET1_R, -FILLET1_R), FILLET1_R, 90, 90)
            Line((0, -FILLET1_R), (0, 0))
            Line((0, 0), (FILLET1_R, 0))
        make_face()
    fillet1_piece_13 = extrude(amount=570.45259082, mode=Mode.PRIVATE)
    fillet1_piece_13 = split(fillet1_piece_13, bisect_by=Plane(origin=(139.225783569, 43.764750927, 14.776706333), z_dir=(-0.7014530599300108, 0.712715654882664, 0)), keep=Keep.TOP, mode=Mode.PRIVATE)
    fillet1_piece_13 = split(fillet1_piece_13, bisect_by=Plane(origin=(-142.20285466, 43.465709552, 14.776706333), z_dir=(0.7082202214843082, 0.7059915848512059, 0)), keep=Keep.TOP, mode=Mode.PRIVATE)
    add(fillet1_piece_13, mode=Mode.SUBTRACT)
    with BuildSketch(Plane(origin=(313.12, -200, -17.5), x_dir=(0, 1, 0), z_dir=(0, 0, 1))) as fillet1_piece_14:
        with BuildLine():
            CenterArc((FILLET1_R, FILLET1_R), FILLET1_R, 180, 90)
            Line((0, FILLET1_R), (0, 0))
            Line((0, 0), (FILLET1_R, 0))
        make_face()
    extrude(amount=35, mode=Mode.SUBTRACT)
    with BuildSketch(Plane(origin=(282.728718813, 185, -16.023890127), x_dir=(0.7127156548826233, 0.701453059930052, 0), z_dir=(0, 0, 1)), Plane(origin=(-282.723872007, 185, -16.023890127), x_dir=(1, 0, 0), z_dir=(0, 0, 1))) as fillet1_piece_15:
        with BuildLine():
            CenterArc((FILLET1_R * 0.409556050901, FILLET1_R), FILLET1_R, 225.456300233, 44.543699767)
            Line((-FILLET1_R * 0.291897009029, FILLET1_R * 0.287284345117), (0, 0))
            Line((0, 0), (FILLET1_R * 0.409556050901, 0))
        make_face()
    extrude(amount=32.047780255, mode=Mode.SUBTRACT)
    with BuildSketch(Plane(origin=(283.12, 187.322832525, 15), x_dir=(1, 0, 0), z_dir=(0, -1, 0))) as fillet1_piece_16_section:
        with BuildLine():
            CenterArc((FILLET1_R, -FILLET1_R), FILLET1_R, 90, 90)
            Line((0, -FILLET1_R), (0, 0))
            Line((0, 0), (FILLET1_R, 0))
        make_face()
    fillet1_piece_16 = extrude(amount=283.054064858, mode=Mode.PRIVATE)
    fillet1_piece_16 = split(fillet1_piece_16, bisect_by=Plane(origin=(212.904028108, 116.278704743, 14.776762441), z_dir=(0.7014530599300108, -0.712715654882664, 0)), keep=Keep.TOP, mode=Mode.PRIVATE)
    add(fillet1_piece_16, mode=Mode.SUBTRACT)
    with BuildSketch(Plane(origin=(312.12, 215, 15), x_dir=(0, -1, 0), z_dir=(-1, 0, 0))) as fillet1_piece_17:
        with BuildLine():
            CenterArc((FILLET1_R, -FILLET1_R), FILLET1_R, 90, 90)
            Line((0, -FILLET1_R), (0, 0))
            Line((0, 0), (FILLET1_R, 0))
        make_face()
    extrude(amount=624.235153194, mode=Mode.SUBTRACT)
    with BuildSketch(Plane(origin=(-283.115153194, -95.731232334, -15), x_dir=(-1, 0, 0), z_dir=(0, 1, 0))) as fillet1_piece_18_section:
        with BuildLine():
            CenterArc((FILLET1_R, FILLET1_R), FILLET1_R, 180, 90)
            Line((0, FILLET1_R), (0, 0))
            Line((0, 0), (FILLET1_R, 0))
        make_face()
    fillet1_piece_18 = extrude(amount=283.054064858, mode=Mode.PRIVATE)
    fillet1_piece_18 = split(fillet1_piece_18, bisect_by=Plane(origin=(-142.946899789, 44.212103442, -14.61922956), z_dir=(-0.7082202214843082, -0.7059915848512059, 0)), keep=Keep.TOP, mode=Mode.PRIVATE)
    add(fillet1_piece_18, mode=Mode.SUBTRACT)
    with BuildSketch(Plane(origin=(-283.115153194, -95.731232334, 15), x_dir=(-1, 0, 0), z_dir=(0, 1, 0))) as fillet1_piece_19_section:
        with BuildLine():
            CenterArc((FILLET1_R, -FILLET1_R), FILLET1_R, 90, 90)
            Line((0, -FILLET1_R), (0, 0))
            Line((0, 0), (FILLET1_R, 0))
        make_face()
    fillet1_piece_19 = extrude(amount=283.054064858, mode=Mode.PRIVATE)
    fillet1_piece_19 = split(fillet1_piece_19, bisect_by=Plane(origin=(-142.946899789, 44.212103442, 14.61922956), z_dir=(-0.7082202214843082, -0.7059915848512059, 0)), keep=Keep.TOP, mode=Mode.PRIVATE)
    add(fillet1_piece_19, mode=Mode.SUBTRACT)


solid = part.part
